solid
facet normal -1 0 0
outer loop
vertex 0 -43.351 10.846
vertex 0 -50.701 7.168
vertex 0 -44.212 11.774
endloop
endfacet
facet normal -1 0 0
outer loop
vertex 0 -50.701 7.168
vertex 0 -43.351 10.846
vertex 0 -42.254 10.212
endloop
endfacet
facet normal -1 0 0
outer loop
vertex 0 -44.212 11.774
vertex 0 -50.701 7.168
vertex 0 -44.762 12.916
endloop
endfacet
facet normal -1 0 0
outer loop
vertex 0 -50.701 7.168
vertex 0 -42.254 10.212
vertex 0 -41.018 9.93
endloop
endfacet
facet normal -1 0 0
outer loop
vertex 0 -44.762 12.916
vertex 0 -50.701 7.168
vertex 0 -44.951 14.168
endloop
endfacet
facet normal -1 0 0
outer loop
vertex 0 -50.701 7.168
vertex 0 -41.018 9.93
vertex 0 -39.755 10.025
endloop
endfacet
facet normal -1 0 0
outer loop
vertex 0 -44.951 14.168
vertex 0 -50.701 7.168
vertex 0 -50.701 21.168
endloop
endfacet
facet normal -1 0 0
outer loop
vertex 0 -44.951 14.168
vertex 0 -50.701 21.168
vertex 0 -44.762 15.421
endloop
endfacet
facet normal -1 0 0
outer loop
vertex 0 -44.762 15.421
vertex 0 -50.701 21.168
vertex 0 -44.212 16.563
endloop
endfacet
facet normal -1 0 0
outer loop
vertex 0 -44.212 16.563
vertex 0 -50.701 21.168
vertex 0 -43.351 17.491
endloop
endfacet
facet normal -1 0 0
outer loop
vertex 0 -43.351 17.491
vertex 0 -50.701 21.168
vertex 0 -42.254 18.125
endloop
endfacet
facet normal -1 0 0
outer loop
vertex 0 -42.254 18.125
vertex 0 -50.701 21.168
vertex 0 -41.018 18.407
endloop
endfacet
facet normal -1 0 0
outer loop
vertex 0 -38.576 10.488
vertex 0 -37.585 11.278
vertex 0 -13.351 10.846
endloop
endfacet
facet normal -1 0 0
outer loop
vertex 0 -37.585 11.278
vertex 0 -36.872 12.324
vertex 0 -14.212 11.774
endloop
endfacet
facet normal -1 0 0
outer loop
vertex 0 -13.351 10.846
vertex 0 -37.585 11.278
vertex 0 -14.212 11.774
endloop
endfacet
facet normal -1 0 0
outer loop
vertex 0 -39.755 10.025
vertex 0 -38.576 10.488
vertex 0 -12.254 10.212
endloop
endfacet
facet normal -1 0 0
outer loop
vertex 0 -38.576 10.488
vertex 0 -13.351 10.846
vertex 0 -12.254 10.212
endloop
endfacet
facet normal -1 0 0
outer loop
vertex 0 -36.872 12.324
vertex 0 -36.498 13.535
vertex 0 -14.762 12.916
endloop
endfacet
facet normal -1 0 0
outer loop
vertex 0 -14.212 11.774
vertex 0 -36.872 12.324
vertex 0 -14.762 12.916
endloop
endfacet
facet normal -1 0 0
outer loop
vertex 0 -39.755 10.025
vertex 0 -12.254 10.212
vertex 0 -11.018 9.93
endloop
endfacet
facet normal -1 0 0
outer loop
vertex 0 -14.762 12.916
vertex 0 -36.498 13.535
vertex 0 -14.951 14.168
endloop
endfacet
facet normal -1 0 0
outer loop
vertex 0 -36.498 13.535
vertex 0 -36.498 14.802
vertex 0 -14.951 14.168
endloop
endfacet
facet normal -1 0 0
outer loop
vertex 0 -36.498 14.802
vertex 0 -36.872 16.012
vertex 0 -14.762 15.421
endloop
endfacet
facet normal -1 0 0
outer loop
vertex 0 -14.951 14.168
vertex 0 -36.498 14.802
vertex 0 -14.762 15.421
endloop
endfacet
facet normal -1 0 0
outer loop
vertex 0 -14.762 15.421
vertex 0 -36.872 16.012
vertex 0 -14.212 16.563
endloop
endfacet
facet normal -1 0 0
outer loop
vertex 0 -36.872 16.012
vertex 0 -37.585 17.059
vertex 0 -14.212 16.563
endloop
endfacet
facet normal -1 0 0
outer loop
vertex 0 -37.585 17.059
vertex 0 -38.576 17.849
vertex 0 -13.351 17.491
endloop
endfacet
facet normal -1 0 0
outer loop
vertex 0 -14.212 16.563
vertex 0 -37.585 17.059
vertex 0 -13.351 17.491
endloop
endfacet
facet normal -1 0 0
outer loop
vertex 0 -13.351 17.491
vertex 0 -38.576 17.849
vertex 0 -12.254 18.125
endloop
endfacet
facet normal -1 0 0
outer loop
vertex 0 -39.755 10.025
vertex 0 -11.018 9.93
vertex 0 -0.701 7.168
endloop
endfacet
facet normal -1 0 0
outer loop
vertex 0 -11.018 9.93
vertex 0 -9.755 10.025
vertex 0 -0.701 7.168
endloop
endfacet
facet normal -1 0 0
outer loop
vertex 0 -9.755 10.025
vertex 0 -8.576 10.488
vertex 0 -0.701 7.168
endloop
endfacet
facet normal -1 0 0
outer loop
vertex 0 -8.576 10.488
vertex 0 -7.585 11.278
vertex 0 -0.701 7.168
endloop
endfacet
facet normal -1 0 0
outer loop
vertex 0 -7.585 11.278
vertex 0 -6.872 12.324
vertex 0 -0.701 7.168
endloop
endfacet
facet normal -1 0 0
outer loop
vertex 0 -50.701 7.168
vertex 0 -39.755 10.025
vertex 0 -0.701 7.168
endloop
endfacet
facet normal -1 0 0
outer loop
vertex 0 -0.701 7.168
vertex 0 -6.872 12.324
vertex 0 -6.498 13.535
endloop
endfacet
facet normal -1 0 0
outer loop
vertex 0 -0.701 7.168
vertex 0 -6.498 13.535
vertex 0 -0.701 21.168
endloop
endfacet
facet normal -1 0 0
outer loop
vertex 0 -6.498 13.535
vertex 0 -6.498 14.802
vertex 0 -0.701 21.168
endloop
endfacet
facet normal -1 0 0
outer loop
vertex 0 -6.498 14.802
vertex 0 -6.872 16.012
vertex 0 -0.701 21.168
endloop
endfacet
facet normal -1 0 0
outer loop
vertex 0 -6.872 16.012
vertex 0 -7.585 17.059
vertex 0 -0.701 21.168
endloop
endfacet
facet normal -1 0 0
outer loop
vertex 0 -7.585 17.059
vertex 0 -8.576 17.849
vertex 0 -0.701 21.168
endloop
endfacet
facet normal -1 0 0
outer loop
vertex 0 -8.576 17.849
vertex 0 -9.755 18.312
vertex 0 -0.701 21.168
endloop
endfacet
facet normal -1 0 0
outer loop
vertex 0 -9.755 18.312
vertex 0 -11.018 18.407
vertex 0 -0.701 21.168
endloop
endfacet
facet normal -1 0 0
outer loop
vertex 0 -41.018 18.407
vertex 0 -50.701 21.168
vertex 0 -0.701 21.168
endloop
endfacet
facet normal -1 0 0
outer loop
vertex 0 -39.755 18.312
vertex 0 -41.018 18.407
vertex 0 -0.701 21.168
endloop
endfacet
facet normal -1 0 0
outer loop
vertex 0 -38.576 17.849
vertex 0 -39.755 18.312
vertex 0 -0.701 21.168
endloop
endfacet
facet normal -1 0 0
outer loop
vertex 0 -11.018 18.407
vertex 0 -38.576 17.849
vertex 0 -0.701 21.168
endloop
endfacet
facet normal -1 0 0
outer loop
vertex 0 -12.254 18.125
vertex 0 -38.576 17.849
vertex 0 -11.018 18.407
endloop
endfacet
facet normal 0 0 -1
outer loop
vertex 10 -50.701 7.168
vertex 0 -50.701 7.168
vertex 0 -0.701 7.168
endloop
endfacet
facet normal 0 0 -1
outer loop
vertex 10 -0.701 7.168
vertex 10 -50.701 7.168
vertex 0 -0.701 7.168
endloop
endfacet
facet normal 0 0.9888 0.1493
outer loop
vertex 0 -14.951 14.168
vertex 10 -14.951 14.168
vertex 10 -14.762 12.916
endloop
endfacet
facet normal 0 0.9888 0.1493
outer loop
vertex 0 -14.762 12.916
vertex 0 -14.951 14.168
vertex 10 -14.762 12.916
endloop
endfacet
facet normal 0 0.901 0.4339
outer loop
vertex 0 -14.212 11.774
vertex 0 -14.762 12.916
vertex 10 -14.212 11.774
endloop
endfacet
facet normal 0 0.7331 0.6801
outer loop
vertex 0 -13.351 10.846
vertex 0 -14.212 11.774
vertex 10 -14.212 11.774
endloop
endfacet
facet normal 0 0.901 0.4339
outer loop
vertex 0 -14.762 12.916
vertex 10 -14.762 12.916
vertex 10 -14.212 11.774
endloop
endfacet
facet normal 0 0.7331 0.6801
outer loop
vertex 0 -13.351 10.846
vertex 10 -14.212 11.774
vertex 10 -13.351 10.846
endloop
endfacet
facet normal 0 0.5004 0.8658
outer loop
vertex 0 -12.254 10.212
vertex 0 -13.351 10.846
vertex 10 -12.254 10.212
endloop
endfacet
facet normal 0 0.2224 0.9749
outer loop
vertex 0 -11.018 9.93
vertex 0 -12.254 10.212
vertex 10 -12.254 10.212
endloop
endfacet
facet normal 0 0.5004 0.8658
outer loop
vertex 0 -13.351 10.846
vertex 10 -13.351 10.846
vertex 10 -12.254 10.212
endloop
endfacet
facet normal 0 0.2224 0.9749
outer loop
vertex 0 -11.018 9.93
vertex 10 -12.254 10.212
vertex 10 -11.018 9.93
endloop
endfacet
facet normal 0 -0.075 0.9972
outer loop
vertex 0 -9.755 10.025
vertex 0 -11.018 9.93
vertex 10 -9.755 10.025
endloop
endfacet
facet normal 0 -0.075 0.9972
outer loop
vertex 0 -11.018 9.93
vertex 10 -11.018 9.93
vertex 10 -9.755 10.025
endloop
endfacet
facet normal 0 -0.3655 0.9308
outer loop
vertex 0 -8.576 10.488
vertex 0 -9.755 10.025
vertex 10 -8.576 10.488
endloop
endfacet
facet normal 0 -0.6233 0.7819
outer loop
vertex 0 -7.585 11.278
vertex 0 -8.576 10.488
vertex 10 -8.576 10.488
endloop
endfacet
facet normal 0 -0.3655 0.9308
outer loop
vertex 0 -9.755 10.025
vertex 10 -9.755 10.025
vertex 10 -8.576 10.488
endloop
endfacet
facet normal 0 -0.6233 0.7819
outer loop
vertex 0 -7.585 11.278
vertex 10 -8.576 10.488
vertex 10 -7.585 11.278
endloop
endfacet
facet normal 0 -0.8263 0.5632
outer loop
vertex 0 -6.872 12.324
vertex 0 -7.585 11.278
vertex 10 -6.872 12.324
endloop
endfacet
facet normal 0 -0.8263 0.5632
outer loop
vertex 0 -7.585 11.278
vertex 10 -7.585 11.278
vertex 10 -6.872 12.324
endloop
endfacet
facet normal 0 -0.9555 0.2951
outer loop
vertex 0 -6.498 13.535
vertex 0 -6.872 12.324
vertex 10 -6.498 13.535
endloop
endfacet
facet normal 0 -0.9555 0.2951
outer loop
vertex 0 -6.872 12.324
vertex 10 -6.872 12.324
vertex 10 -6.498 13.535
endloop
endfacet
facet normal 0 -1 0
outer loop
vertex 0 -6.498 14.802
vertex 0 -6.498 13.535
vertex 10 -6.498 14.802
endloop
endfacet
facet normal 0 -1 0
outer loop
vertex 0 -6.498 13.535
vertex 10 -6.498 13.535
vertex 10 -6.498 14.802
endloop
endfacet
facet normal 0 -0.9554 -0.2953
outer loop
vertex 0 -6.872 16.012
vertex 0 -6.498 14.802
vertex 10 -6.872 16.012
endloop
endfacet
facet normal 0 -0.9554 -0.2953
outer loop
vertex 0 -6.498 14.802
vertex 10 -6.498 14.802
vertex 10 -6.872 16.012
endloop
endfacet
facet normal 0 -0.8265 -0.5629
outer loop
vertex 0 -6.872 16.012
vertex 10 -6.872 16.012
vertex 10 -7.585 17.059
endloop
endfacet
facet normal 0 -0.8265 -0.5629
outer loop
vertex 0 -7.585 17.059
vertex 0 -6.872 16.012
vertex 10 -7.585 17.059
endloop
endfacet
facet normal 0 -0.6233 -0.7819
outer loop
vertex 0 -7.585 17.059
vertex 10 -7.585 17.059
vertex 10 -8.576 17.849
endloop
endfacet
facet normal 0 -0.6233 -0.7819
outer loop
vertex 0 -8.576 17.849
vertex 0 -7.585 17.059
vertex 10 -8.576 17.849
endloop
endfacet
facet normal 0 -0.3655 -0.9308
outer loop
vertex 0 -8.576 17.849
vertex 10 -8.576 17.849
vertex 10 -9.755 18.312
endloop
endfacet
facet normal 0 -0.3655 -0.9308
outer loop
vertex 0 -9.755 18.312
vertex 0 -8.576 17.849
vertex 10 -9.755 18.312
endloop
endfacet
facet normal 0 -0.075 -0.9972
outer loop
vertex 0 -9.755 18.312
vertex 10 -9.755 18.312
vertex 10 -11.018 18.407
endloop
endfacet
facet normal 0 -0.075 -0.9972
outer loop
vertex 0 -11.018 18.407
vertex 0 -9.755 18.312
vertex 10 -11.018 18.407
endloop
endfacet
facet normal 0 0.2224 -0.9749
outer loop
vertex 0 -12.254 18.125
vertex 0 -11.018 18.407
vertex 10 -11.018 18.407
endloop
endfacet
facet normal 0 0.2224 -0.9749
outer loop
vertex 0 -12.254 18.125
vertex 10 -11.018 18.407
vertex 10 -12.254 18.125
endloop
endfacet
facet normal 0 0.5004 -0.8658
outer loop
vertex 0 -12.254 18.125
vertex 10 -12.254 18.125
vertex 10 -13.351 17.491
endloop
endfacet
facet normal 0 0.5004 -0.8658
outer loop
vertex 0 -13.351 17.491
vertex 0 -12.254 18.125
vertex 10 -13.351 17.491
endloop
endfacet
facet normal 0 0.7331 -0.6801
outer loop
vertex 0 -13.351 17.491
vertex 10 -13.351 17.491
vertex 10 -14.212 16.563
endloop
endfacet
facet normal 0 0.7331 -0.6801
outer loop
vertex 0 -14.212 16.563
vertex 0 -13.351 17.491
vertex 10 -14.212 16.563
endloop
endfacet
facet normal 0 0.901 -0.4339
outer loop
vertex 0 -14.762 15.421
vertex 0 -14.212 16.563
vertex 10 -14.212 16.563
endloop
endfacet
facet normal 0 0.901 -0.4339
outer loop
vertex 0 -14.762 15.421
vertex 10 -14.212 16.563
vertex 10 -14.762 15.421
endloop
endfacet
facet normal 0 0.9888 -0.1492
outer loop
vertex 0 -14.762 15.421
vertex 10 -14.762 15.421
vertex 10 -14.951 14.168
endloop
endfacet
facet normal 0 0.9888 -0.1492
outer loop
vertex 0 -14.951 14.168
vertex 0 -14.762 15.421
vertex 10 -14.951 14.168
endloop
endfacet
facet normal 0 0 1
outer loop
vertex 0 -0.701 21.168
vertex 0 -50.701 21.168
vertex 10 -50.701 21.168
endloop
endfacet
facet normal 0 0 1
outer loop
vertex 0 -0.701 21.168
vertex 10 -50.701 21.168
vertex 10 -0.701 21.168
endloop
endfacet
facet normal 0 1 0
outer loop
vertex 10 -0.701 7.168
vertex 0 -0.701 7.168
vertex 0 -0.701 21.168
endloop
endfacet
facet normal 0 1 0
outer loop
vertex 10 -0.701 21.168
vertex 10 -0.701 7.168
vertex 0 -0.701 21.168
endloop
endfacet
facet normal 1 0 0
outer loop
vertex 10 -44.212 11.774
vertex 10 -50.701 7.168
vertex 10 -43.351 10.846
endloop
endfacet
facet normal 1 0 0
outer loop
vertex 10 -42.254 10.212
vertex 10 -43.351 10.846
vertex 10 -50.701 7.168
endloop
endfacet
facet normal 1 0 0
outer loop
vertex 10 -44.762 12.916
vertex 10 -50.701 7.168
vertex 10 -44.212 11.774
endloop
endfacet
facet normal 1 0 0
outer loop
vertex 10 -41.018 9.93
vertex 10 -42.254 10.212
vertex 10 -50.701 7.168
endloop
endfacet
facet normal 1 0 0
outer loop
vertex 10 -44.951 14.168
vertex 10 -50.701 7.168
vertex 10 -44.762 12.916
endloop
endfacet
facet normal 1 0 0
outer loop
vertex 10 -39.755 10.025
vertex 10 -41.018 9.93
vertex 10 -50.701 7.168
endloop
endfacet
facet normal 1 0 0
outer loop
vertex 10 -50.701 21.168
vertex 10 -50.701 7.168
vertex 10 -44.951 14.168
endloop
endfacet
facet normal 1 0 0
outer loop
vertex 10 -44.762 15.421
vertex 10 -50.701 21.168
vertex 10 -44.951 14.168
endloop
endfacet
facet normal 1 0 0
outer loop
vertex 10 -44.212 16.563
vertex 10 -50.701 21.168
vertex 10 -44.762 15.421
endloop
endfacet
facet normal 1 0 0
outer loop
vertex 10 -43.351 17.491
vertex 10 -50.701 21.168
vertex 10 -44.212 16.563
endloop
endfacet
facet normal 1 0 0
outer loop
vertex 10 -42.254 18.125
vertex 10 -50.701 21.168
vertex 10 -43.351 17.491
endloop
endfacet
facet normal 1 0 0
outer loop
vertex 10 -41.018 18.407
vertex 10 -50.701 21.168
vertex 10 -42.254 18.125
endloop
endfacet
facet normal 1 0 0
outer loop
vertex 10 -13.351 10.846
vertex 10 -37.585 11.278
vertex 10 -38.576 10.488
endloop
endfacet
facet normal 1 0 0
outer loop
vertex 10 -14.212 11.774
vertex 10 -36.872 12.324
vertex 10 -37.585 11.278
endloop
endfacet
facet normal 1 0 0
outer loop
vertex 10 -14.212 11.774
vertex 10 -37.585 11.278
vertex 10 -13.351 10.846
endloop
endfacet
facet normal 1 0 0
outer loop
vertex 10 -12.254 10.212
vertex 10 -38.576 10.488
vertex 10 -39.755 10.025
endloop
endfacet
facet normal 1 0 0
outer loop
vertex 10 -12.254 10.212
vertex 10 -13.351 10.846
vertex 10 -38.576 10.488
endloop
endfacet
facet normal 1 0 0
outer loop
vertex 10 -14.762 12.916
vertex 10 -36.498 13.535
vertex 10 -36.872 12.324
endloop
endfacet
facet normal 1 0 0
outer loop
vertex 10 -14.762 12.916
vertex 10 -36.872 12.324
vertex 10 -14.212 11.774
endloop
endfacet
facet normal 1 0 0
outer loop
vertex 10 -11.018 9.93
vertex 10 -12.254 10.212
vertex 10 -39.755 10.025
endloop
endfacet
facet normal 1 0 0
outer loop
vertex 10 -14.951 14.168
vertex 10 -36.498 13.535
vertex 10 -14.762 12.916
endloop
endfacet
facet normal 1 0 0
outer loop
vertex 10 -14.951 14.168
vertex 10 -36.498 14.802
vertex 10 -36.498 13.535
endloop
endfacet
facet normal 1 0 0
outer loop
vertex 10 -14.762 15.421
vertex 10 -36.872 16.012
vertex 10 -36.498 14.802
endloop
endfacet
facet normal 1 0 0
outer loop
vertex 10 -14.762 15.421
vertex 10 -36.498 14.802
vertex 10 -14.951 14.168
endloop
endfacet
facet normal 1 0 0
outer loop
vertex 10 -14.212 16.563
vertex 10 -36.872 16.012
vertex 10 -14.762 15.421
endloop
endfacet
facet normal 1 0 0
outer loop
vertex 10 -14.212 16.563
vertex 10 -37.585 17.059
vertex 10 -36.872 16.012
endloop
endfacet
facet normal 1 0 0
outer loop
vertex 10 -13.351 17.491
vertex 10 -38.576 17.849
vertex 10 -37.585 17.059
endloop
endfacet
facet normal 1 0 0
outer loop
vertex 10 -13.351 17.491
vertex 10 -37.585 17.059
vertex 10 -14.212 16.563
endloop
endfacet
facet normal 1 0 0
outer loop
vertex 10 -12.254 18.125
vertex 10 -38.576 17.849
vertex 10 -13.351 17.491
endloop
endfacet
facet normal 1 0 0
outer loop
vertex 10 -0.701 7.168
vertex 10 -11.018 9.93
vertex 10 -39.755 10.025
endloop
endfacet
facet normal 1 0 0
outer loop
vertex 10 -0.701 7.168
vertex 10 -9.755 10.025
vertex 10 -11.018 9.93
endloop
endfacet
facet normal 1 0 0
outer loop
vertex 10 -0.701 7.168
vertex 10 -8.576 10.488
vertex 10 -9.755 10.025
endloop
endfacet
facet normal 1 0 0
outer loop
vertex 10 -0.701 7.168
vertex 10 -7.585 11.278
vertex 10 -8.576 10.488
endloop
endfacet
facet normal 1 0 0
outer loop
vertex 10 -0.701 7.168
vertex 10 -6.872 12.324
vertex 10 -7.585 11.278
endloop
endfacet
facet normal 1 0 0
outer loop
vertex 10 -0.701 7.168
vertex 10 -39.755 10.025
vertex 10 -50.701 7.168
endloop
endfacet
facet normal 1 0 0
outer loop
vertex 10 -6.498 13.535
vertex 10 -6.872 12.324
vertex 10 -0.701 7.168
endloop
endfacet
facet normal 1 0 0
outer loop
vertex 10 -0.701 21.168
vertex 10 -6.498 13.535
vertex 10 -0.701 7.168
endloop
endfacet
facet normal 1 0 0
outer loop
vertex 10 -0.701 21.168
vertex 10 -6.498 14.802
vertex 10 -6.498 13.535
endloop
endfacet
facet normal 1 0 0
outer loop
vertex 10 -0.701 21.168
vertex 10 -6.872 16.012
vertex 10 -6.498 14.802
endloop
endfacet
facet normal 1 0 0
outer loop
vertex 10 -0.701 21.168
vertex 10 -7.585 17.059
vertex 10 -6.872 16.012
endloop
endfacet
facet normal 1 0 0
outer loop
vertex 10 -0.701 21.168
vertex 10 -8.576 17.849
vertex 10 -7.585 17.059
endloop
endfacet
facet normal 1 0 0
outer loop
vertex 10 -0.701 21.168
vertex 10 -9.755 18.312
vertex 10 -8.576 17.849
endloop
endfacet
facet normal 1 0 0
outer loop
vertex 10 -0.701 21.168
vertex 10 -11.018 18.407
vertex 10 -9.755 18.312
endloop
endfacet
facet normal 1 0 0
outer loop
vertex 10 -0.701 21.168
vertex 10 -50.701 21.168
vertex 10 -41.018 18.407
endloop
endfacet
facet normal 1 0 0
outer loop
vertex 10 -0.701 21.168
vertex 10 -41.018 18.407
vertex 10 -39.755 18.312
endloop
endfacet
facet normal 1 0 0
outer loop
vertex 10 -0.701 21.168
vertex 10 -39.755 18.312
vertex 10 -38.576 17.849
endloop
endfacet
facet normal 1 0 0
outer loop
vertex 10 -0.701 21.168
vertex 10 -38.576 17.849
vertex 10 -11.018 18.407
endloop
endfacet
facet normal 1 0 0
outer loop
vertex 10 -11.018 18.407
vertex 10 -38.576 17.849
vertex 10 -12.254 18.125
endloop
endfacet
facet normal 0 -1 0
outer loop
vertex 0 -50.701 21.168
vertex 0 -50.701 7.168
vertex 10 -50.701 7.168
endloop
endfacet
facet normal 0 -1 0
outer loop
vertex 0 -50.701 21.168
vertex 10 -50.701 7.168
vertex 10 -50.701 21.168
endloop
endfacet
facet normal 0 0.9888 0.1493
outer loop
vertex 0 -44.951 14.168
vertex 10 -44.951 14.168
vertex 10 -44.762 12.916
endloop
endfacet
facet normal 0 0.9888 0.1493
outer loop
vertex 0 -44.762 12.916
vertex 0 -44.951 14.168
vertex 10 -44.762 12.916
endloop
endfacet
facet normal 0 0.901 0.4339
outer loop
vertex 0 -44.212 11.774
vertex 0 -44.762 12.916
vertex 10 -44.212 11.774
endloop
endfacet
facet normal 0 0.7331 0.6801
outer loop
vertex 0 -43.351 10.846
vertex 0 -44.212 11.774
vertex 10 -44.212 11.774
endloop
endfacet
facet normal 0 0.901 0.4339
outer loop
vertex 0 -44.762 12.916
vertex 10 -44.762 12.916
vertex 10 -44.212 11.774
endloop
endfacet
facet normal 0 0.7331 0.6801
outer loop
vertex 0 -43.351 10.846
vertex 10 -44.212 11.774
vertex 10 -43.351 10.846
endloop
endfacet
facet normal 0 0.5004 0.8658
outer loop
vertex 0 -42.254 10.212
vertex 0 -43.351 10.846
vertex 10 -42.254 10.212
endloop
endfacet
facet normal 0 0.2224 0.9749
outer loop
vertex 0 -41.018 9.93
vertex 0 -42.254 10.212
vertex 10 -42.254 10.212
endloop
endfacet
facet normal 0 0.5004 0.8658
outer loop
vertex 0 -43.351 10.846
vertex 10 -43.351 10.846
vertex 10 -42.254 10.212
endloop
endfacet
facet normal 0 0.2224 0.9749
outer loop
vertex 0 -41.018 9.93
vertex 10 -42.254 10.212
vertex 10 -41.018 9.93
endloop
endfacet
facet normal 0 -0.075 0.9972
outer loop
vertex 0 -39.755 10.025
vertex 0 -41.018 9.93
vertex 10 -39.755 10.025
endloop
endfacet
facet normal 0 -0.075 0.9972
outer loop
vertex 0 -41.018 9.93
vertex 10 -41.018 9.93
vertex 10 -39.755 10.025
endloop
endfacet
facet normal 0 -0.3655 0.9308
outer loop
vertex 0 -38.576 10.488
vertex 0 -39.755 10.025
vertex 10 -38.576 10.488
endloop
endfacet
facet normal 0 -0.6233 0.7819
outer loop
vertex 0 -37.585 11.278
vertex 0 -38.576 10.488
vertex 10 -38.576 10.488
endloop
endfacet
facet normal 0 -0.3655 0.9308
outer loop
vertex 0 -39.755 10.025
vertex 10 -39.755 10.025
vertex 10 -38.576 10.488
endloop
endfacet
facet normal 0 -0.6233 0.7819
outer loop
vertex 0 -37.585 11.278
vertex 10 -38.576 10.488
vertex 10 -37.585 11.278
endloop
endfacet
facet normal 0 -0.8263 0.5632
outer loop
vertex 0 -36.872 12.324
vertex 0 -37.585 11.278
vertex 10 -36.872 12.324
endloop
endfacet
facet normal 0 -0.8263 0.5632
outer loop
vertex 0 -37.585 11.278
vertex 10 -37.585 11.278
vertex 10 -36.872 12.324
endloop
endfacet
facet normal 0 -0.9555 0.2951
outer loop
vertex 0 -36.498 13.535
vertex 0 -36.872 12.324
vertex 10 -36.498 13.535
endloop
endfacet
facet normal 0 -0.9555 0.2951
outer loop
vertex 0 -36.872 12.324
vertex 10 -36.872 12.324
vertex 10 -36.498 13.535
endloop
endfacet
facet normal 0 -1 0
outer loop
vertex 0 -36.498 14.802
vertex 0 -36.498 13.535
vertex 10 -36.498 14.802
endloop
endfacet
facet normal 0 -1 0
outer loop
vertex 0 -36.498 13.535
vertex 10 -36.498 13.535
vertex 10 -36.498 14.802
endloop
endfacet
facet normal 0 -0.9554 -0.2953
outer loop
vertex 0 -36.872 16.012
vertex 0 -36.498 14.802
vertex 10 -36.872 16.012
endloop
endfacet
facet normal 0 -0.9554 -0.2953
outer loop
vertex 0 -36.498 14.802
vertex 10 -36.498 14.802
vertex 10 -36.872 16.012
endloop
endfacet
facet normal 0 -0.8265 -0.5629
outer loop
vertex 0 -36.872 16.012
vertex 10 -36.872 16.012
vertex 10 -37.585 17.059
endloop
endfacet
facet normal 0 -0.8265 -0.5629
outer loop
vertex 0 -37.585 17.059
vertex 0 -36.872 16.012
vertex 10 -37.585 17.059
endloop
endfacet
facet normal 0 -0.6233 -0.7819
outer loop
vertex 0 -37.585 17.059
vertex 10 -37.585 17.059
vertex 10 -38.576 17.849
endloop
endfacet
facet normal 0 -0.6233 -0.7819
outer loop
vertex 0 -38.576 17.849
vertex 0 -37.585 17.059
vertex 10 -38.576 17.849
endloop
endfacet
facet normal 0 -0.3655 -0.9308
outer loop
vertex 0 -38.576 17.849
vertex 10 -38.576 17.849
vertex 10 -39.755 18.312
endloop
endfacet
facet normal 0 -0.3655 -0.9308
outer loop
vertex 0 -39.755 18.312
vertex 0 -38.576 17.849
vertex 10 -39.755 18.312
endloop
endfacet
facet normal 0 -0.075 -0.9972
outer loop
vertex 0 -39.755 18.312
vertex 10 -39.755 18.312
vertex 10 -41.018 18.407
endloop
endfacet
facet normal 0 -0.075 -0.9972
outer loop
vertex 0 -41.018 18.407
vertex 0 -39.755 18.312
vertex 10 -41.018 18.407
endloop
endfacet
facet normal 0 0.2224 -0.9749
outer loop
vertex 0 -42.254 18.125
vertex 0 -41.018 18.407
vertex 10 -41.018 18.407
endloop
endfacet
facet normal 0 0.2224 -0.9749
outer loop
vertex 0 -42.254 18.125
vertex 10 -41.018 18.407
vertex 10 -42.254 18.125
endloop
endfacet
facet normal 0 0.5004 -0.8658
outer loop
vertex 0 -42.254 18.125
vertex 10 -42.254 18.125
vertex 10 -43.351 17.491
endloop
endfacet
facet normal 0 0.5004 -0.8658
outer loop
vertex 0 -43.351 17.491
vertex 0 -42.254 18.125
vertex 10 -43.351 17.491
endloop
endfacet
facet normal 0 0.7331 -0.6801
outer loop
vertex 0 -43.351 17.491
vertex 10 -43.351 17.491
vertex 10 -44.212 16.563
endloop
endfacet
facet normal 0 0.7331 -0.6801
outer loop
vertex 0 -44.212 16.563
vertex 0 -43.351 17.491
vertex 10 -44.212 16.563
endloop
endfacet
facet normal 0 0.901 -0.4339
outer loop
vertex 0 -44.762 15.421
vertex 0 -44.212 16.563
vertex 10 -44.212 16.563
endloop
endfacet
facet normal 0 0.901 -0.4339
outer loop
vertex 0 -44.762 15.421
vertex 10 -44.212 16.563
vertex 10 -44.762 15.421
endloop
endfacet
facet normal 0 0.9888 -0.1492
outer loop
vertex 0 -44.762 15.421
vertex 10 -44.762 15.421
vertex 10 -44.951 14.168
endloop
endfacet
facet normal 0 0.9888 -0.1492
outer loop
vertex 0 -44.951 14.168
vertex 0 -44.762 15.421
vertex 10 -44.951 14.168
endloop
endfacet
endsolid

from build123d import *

# Parameters (mm, degrees)
F0_W     = 50
F0_H     = 14
F1_DEPTH = 10
F2_D     = 8.5


with BuildPart() as f1:
    # F0 (on Right) → F1 (new body)
    with BuildSketch(Plane.YZ):
        with Locations((-25.7008373737, 14.168410562)):
            Rectangle(F0_W, F0_H)
    extrude(amount=F1_DEPTH)

    # F2 (through all)
    with Locations(Plane(origin=(0, 0, 0), x_dir=(0, 1, 0), z_dir=(-1, 0, 0))):
        with Locations((-40.7008373737, -14.168410562), (-10.7008373737, -14.168410562)):
            Hole(F2_D / 2)


solid = f1.part
